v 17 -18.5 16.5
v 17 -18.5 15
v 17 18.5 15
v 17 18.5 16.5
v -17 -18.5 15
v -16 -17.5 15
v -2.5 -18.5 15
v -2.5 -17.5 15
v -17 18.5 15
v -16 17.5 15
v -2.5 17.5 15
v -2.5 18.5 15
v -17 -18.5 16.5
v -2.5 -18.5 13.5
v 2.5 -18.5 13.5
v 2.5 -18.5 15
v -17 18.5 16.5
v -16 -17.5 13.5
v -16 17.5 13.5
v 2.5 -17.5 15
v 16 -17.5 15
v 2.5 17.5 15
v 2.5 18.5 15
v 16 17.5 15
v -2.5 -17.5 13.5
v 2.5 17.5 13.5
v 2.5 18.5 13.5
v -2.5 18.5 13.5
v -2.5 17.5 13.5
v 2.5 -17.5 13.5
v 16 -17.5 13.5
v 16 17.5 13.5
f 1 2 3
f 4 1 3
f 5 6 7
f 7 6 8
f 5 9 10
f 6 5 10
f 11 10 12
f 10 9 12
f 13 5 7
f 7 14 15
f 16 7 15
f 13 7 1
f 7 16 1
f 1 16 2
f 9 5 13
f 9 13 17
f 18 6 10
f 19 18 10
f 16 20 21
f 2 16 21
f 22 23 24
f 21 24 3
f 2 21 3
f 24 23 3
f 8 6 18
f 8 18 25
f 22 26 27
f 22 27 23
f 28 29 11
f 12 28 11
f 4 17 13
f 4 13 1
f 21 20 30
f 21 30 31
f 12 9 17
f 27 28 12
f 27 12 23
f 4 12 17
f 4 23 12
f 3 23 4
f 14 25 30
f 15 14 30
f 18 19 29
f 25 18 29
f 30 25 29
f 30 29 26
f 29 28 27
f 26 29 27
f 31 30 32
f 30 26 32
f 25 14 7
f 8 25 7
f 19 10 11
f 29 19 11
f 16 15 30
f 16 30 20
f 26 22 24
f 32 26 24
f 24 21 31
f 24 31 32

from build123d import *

# Parameters (mm, degrees)
SKETCH_W        = 34
SKETCH_H        = 37
PAD_DEPTH       = 15
SKETCH001_W     = 32
SKETCH001_H     = 35
POCKET_DEPTH    = 1.5
SKETCH002_W     = 30
SKETCH002_H     = 33
POCKET001_DEPTH = 10
SKETCH003_W     = 5
SKETCH003_H     = 5
POCKET002_DEPTH = 300
SKETCH004_W     = 34
SKETCH004_H     = 37
PAD001_DEPTH    = 1.5


with BuildPart() as pocket002:
    # Sketch → Pad (new body)
    with BuildSketch(Plane.XY):
        Rectangle(SKETCH_W, SKETCH_H)
    extrude(amount=PAD_DEPTH)

    # Sketch001 → Pocket (cut)
    with BuildSketch(Plane.XY.offset(15)):
        Rectangle(SKETCH001_W, SKETCH001_H)
    extrude(amount=-POCKET_DEPTH, mode=Mode.SUBTRACT)

    # Sketch002 → Pocket001 (cut)
    with BuildSketch(Plane.XY.offset(13.5)):
        Rectangle(SKETCH002_W, SKETCH002_H)
    extrude(amount=-POCKET001_DEPTH, mode=Mode.SUBTRACT)

    # Sketch003 → Pocket002 (cut)
    with BuildSketch(Plane.XZ.offset(18.5)):
        with Locations((0, 12.5)):
            Rectangle(SKETCH003_W, SKETCH003_H)
    extrude(amount=-POCKET002_DEPTH, mode=Mode.SUBTRACT)


with BuildPart() as cut:
    # Pad001 base: copy of Pocket002
    add(pocket002.part)

    # Sketch004 → Pad001 (new body, symmetric)
    with BuildSketch(Plane.XY.offset(15)):
        Rectangle(SKETCH004_W, SKETCH004_H)
    extrude(amount=PAD001_DEPTH, both=True)

    # Cut: cut Pocket002
    add(pocket002.part, mode=Mode.SUBTRACT)


solid = cut.part
